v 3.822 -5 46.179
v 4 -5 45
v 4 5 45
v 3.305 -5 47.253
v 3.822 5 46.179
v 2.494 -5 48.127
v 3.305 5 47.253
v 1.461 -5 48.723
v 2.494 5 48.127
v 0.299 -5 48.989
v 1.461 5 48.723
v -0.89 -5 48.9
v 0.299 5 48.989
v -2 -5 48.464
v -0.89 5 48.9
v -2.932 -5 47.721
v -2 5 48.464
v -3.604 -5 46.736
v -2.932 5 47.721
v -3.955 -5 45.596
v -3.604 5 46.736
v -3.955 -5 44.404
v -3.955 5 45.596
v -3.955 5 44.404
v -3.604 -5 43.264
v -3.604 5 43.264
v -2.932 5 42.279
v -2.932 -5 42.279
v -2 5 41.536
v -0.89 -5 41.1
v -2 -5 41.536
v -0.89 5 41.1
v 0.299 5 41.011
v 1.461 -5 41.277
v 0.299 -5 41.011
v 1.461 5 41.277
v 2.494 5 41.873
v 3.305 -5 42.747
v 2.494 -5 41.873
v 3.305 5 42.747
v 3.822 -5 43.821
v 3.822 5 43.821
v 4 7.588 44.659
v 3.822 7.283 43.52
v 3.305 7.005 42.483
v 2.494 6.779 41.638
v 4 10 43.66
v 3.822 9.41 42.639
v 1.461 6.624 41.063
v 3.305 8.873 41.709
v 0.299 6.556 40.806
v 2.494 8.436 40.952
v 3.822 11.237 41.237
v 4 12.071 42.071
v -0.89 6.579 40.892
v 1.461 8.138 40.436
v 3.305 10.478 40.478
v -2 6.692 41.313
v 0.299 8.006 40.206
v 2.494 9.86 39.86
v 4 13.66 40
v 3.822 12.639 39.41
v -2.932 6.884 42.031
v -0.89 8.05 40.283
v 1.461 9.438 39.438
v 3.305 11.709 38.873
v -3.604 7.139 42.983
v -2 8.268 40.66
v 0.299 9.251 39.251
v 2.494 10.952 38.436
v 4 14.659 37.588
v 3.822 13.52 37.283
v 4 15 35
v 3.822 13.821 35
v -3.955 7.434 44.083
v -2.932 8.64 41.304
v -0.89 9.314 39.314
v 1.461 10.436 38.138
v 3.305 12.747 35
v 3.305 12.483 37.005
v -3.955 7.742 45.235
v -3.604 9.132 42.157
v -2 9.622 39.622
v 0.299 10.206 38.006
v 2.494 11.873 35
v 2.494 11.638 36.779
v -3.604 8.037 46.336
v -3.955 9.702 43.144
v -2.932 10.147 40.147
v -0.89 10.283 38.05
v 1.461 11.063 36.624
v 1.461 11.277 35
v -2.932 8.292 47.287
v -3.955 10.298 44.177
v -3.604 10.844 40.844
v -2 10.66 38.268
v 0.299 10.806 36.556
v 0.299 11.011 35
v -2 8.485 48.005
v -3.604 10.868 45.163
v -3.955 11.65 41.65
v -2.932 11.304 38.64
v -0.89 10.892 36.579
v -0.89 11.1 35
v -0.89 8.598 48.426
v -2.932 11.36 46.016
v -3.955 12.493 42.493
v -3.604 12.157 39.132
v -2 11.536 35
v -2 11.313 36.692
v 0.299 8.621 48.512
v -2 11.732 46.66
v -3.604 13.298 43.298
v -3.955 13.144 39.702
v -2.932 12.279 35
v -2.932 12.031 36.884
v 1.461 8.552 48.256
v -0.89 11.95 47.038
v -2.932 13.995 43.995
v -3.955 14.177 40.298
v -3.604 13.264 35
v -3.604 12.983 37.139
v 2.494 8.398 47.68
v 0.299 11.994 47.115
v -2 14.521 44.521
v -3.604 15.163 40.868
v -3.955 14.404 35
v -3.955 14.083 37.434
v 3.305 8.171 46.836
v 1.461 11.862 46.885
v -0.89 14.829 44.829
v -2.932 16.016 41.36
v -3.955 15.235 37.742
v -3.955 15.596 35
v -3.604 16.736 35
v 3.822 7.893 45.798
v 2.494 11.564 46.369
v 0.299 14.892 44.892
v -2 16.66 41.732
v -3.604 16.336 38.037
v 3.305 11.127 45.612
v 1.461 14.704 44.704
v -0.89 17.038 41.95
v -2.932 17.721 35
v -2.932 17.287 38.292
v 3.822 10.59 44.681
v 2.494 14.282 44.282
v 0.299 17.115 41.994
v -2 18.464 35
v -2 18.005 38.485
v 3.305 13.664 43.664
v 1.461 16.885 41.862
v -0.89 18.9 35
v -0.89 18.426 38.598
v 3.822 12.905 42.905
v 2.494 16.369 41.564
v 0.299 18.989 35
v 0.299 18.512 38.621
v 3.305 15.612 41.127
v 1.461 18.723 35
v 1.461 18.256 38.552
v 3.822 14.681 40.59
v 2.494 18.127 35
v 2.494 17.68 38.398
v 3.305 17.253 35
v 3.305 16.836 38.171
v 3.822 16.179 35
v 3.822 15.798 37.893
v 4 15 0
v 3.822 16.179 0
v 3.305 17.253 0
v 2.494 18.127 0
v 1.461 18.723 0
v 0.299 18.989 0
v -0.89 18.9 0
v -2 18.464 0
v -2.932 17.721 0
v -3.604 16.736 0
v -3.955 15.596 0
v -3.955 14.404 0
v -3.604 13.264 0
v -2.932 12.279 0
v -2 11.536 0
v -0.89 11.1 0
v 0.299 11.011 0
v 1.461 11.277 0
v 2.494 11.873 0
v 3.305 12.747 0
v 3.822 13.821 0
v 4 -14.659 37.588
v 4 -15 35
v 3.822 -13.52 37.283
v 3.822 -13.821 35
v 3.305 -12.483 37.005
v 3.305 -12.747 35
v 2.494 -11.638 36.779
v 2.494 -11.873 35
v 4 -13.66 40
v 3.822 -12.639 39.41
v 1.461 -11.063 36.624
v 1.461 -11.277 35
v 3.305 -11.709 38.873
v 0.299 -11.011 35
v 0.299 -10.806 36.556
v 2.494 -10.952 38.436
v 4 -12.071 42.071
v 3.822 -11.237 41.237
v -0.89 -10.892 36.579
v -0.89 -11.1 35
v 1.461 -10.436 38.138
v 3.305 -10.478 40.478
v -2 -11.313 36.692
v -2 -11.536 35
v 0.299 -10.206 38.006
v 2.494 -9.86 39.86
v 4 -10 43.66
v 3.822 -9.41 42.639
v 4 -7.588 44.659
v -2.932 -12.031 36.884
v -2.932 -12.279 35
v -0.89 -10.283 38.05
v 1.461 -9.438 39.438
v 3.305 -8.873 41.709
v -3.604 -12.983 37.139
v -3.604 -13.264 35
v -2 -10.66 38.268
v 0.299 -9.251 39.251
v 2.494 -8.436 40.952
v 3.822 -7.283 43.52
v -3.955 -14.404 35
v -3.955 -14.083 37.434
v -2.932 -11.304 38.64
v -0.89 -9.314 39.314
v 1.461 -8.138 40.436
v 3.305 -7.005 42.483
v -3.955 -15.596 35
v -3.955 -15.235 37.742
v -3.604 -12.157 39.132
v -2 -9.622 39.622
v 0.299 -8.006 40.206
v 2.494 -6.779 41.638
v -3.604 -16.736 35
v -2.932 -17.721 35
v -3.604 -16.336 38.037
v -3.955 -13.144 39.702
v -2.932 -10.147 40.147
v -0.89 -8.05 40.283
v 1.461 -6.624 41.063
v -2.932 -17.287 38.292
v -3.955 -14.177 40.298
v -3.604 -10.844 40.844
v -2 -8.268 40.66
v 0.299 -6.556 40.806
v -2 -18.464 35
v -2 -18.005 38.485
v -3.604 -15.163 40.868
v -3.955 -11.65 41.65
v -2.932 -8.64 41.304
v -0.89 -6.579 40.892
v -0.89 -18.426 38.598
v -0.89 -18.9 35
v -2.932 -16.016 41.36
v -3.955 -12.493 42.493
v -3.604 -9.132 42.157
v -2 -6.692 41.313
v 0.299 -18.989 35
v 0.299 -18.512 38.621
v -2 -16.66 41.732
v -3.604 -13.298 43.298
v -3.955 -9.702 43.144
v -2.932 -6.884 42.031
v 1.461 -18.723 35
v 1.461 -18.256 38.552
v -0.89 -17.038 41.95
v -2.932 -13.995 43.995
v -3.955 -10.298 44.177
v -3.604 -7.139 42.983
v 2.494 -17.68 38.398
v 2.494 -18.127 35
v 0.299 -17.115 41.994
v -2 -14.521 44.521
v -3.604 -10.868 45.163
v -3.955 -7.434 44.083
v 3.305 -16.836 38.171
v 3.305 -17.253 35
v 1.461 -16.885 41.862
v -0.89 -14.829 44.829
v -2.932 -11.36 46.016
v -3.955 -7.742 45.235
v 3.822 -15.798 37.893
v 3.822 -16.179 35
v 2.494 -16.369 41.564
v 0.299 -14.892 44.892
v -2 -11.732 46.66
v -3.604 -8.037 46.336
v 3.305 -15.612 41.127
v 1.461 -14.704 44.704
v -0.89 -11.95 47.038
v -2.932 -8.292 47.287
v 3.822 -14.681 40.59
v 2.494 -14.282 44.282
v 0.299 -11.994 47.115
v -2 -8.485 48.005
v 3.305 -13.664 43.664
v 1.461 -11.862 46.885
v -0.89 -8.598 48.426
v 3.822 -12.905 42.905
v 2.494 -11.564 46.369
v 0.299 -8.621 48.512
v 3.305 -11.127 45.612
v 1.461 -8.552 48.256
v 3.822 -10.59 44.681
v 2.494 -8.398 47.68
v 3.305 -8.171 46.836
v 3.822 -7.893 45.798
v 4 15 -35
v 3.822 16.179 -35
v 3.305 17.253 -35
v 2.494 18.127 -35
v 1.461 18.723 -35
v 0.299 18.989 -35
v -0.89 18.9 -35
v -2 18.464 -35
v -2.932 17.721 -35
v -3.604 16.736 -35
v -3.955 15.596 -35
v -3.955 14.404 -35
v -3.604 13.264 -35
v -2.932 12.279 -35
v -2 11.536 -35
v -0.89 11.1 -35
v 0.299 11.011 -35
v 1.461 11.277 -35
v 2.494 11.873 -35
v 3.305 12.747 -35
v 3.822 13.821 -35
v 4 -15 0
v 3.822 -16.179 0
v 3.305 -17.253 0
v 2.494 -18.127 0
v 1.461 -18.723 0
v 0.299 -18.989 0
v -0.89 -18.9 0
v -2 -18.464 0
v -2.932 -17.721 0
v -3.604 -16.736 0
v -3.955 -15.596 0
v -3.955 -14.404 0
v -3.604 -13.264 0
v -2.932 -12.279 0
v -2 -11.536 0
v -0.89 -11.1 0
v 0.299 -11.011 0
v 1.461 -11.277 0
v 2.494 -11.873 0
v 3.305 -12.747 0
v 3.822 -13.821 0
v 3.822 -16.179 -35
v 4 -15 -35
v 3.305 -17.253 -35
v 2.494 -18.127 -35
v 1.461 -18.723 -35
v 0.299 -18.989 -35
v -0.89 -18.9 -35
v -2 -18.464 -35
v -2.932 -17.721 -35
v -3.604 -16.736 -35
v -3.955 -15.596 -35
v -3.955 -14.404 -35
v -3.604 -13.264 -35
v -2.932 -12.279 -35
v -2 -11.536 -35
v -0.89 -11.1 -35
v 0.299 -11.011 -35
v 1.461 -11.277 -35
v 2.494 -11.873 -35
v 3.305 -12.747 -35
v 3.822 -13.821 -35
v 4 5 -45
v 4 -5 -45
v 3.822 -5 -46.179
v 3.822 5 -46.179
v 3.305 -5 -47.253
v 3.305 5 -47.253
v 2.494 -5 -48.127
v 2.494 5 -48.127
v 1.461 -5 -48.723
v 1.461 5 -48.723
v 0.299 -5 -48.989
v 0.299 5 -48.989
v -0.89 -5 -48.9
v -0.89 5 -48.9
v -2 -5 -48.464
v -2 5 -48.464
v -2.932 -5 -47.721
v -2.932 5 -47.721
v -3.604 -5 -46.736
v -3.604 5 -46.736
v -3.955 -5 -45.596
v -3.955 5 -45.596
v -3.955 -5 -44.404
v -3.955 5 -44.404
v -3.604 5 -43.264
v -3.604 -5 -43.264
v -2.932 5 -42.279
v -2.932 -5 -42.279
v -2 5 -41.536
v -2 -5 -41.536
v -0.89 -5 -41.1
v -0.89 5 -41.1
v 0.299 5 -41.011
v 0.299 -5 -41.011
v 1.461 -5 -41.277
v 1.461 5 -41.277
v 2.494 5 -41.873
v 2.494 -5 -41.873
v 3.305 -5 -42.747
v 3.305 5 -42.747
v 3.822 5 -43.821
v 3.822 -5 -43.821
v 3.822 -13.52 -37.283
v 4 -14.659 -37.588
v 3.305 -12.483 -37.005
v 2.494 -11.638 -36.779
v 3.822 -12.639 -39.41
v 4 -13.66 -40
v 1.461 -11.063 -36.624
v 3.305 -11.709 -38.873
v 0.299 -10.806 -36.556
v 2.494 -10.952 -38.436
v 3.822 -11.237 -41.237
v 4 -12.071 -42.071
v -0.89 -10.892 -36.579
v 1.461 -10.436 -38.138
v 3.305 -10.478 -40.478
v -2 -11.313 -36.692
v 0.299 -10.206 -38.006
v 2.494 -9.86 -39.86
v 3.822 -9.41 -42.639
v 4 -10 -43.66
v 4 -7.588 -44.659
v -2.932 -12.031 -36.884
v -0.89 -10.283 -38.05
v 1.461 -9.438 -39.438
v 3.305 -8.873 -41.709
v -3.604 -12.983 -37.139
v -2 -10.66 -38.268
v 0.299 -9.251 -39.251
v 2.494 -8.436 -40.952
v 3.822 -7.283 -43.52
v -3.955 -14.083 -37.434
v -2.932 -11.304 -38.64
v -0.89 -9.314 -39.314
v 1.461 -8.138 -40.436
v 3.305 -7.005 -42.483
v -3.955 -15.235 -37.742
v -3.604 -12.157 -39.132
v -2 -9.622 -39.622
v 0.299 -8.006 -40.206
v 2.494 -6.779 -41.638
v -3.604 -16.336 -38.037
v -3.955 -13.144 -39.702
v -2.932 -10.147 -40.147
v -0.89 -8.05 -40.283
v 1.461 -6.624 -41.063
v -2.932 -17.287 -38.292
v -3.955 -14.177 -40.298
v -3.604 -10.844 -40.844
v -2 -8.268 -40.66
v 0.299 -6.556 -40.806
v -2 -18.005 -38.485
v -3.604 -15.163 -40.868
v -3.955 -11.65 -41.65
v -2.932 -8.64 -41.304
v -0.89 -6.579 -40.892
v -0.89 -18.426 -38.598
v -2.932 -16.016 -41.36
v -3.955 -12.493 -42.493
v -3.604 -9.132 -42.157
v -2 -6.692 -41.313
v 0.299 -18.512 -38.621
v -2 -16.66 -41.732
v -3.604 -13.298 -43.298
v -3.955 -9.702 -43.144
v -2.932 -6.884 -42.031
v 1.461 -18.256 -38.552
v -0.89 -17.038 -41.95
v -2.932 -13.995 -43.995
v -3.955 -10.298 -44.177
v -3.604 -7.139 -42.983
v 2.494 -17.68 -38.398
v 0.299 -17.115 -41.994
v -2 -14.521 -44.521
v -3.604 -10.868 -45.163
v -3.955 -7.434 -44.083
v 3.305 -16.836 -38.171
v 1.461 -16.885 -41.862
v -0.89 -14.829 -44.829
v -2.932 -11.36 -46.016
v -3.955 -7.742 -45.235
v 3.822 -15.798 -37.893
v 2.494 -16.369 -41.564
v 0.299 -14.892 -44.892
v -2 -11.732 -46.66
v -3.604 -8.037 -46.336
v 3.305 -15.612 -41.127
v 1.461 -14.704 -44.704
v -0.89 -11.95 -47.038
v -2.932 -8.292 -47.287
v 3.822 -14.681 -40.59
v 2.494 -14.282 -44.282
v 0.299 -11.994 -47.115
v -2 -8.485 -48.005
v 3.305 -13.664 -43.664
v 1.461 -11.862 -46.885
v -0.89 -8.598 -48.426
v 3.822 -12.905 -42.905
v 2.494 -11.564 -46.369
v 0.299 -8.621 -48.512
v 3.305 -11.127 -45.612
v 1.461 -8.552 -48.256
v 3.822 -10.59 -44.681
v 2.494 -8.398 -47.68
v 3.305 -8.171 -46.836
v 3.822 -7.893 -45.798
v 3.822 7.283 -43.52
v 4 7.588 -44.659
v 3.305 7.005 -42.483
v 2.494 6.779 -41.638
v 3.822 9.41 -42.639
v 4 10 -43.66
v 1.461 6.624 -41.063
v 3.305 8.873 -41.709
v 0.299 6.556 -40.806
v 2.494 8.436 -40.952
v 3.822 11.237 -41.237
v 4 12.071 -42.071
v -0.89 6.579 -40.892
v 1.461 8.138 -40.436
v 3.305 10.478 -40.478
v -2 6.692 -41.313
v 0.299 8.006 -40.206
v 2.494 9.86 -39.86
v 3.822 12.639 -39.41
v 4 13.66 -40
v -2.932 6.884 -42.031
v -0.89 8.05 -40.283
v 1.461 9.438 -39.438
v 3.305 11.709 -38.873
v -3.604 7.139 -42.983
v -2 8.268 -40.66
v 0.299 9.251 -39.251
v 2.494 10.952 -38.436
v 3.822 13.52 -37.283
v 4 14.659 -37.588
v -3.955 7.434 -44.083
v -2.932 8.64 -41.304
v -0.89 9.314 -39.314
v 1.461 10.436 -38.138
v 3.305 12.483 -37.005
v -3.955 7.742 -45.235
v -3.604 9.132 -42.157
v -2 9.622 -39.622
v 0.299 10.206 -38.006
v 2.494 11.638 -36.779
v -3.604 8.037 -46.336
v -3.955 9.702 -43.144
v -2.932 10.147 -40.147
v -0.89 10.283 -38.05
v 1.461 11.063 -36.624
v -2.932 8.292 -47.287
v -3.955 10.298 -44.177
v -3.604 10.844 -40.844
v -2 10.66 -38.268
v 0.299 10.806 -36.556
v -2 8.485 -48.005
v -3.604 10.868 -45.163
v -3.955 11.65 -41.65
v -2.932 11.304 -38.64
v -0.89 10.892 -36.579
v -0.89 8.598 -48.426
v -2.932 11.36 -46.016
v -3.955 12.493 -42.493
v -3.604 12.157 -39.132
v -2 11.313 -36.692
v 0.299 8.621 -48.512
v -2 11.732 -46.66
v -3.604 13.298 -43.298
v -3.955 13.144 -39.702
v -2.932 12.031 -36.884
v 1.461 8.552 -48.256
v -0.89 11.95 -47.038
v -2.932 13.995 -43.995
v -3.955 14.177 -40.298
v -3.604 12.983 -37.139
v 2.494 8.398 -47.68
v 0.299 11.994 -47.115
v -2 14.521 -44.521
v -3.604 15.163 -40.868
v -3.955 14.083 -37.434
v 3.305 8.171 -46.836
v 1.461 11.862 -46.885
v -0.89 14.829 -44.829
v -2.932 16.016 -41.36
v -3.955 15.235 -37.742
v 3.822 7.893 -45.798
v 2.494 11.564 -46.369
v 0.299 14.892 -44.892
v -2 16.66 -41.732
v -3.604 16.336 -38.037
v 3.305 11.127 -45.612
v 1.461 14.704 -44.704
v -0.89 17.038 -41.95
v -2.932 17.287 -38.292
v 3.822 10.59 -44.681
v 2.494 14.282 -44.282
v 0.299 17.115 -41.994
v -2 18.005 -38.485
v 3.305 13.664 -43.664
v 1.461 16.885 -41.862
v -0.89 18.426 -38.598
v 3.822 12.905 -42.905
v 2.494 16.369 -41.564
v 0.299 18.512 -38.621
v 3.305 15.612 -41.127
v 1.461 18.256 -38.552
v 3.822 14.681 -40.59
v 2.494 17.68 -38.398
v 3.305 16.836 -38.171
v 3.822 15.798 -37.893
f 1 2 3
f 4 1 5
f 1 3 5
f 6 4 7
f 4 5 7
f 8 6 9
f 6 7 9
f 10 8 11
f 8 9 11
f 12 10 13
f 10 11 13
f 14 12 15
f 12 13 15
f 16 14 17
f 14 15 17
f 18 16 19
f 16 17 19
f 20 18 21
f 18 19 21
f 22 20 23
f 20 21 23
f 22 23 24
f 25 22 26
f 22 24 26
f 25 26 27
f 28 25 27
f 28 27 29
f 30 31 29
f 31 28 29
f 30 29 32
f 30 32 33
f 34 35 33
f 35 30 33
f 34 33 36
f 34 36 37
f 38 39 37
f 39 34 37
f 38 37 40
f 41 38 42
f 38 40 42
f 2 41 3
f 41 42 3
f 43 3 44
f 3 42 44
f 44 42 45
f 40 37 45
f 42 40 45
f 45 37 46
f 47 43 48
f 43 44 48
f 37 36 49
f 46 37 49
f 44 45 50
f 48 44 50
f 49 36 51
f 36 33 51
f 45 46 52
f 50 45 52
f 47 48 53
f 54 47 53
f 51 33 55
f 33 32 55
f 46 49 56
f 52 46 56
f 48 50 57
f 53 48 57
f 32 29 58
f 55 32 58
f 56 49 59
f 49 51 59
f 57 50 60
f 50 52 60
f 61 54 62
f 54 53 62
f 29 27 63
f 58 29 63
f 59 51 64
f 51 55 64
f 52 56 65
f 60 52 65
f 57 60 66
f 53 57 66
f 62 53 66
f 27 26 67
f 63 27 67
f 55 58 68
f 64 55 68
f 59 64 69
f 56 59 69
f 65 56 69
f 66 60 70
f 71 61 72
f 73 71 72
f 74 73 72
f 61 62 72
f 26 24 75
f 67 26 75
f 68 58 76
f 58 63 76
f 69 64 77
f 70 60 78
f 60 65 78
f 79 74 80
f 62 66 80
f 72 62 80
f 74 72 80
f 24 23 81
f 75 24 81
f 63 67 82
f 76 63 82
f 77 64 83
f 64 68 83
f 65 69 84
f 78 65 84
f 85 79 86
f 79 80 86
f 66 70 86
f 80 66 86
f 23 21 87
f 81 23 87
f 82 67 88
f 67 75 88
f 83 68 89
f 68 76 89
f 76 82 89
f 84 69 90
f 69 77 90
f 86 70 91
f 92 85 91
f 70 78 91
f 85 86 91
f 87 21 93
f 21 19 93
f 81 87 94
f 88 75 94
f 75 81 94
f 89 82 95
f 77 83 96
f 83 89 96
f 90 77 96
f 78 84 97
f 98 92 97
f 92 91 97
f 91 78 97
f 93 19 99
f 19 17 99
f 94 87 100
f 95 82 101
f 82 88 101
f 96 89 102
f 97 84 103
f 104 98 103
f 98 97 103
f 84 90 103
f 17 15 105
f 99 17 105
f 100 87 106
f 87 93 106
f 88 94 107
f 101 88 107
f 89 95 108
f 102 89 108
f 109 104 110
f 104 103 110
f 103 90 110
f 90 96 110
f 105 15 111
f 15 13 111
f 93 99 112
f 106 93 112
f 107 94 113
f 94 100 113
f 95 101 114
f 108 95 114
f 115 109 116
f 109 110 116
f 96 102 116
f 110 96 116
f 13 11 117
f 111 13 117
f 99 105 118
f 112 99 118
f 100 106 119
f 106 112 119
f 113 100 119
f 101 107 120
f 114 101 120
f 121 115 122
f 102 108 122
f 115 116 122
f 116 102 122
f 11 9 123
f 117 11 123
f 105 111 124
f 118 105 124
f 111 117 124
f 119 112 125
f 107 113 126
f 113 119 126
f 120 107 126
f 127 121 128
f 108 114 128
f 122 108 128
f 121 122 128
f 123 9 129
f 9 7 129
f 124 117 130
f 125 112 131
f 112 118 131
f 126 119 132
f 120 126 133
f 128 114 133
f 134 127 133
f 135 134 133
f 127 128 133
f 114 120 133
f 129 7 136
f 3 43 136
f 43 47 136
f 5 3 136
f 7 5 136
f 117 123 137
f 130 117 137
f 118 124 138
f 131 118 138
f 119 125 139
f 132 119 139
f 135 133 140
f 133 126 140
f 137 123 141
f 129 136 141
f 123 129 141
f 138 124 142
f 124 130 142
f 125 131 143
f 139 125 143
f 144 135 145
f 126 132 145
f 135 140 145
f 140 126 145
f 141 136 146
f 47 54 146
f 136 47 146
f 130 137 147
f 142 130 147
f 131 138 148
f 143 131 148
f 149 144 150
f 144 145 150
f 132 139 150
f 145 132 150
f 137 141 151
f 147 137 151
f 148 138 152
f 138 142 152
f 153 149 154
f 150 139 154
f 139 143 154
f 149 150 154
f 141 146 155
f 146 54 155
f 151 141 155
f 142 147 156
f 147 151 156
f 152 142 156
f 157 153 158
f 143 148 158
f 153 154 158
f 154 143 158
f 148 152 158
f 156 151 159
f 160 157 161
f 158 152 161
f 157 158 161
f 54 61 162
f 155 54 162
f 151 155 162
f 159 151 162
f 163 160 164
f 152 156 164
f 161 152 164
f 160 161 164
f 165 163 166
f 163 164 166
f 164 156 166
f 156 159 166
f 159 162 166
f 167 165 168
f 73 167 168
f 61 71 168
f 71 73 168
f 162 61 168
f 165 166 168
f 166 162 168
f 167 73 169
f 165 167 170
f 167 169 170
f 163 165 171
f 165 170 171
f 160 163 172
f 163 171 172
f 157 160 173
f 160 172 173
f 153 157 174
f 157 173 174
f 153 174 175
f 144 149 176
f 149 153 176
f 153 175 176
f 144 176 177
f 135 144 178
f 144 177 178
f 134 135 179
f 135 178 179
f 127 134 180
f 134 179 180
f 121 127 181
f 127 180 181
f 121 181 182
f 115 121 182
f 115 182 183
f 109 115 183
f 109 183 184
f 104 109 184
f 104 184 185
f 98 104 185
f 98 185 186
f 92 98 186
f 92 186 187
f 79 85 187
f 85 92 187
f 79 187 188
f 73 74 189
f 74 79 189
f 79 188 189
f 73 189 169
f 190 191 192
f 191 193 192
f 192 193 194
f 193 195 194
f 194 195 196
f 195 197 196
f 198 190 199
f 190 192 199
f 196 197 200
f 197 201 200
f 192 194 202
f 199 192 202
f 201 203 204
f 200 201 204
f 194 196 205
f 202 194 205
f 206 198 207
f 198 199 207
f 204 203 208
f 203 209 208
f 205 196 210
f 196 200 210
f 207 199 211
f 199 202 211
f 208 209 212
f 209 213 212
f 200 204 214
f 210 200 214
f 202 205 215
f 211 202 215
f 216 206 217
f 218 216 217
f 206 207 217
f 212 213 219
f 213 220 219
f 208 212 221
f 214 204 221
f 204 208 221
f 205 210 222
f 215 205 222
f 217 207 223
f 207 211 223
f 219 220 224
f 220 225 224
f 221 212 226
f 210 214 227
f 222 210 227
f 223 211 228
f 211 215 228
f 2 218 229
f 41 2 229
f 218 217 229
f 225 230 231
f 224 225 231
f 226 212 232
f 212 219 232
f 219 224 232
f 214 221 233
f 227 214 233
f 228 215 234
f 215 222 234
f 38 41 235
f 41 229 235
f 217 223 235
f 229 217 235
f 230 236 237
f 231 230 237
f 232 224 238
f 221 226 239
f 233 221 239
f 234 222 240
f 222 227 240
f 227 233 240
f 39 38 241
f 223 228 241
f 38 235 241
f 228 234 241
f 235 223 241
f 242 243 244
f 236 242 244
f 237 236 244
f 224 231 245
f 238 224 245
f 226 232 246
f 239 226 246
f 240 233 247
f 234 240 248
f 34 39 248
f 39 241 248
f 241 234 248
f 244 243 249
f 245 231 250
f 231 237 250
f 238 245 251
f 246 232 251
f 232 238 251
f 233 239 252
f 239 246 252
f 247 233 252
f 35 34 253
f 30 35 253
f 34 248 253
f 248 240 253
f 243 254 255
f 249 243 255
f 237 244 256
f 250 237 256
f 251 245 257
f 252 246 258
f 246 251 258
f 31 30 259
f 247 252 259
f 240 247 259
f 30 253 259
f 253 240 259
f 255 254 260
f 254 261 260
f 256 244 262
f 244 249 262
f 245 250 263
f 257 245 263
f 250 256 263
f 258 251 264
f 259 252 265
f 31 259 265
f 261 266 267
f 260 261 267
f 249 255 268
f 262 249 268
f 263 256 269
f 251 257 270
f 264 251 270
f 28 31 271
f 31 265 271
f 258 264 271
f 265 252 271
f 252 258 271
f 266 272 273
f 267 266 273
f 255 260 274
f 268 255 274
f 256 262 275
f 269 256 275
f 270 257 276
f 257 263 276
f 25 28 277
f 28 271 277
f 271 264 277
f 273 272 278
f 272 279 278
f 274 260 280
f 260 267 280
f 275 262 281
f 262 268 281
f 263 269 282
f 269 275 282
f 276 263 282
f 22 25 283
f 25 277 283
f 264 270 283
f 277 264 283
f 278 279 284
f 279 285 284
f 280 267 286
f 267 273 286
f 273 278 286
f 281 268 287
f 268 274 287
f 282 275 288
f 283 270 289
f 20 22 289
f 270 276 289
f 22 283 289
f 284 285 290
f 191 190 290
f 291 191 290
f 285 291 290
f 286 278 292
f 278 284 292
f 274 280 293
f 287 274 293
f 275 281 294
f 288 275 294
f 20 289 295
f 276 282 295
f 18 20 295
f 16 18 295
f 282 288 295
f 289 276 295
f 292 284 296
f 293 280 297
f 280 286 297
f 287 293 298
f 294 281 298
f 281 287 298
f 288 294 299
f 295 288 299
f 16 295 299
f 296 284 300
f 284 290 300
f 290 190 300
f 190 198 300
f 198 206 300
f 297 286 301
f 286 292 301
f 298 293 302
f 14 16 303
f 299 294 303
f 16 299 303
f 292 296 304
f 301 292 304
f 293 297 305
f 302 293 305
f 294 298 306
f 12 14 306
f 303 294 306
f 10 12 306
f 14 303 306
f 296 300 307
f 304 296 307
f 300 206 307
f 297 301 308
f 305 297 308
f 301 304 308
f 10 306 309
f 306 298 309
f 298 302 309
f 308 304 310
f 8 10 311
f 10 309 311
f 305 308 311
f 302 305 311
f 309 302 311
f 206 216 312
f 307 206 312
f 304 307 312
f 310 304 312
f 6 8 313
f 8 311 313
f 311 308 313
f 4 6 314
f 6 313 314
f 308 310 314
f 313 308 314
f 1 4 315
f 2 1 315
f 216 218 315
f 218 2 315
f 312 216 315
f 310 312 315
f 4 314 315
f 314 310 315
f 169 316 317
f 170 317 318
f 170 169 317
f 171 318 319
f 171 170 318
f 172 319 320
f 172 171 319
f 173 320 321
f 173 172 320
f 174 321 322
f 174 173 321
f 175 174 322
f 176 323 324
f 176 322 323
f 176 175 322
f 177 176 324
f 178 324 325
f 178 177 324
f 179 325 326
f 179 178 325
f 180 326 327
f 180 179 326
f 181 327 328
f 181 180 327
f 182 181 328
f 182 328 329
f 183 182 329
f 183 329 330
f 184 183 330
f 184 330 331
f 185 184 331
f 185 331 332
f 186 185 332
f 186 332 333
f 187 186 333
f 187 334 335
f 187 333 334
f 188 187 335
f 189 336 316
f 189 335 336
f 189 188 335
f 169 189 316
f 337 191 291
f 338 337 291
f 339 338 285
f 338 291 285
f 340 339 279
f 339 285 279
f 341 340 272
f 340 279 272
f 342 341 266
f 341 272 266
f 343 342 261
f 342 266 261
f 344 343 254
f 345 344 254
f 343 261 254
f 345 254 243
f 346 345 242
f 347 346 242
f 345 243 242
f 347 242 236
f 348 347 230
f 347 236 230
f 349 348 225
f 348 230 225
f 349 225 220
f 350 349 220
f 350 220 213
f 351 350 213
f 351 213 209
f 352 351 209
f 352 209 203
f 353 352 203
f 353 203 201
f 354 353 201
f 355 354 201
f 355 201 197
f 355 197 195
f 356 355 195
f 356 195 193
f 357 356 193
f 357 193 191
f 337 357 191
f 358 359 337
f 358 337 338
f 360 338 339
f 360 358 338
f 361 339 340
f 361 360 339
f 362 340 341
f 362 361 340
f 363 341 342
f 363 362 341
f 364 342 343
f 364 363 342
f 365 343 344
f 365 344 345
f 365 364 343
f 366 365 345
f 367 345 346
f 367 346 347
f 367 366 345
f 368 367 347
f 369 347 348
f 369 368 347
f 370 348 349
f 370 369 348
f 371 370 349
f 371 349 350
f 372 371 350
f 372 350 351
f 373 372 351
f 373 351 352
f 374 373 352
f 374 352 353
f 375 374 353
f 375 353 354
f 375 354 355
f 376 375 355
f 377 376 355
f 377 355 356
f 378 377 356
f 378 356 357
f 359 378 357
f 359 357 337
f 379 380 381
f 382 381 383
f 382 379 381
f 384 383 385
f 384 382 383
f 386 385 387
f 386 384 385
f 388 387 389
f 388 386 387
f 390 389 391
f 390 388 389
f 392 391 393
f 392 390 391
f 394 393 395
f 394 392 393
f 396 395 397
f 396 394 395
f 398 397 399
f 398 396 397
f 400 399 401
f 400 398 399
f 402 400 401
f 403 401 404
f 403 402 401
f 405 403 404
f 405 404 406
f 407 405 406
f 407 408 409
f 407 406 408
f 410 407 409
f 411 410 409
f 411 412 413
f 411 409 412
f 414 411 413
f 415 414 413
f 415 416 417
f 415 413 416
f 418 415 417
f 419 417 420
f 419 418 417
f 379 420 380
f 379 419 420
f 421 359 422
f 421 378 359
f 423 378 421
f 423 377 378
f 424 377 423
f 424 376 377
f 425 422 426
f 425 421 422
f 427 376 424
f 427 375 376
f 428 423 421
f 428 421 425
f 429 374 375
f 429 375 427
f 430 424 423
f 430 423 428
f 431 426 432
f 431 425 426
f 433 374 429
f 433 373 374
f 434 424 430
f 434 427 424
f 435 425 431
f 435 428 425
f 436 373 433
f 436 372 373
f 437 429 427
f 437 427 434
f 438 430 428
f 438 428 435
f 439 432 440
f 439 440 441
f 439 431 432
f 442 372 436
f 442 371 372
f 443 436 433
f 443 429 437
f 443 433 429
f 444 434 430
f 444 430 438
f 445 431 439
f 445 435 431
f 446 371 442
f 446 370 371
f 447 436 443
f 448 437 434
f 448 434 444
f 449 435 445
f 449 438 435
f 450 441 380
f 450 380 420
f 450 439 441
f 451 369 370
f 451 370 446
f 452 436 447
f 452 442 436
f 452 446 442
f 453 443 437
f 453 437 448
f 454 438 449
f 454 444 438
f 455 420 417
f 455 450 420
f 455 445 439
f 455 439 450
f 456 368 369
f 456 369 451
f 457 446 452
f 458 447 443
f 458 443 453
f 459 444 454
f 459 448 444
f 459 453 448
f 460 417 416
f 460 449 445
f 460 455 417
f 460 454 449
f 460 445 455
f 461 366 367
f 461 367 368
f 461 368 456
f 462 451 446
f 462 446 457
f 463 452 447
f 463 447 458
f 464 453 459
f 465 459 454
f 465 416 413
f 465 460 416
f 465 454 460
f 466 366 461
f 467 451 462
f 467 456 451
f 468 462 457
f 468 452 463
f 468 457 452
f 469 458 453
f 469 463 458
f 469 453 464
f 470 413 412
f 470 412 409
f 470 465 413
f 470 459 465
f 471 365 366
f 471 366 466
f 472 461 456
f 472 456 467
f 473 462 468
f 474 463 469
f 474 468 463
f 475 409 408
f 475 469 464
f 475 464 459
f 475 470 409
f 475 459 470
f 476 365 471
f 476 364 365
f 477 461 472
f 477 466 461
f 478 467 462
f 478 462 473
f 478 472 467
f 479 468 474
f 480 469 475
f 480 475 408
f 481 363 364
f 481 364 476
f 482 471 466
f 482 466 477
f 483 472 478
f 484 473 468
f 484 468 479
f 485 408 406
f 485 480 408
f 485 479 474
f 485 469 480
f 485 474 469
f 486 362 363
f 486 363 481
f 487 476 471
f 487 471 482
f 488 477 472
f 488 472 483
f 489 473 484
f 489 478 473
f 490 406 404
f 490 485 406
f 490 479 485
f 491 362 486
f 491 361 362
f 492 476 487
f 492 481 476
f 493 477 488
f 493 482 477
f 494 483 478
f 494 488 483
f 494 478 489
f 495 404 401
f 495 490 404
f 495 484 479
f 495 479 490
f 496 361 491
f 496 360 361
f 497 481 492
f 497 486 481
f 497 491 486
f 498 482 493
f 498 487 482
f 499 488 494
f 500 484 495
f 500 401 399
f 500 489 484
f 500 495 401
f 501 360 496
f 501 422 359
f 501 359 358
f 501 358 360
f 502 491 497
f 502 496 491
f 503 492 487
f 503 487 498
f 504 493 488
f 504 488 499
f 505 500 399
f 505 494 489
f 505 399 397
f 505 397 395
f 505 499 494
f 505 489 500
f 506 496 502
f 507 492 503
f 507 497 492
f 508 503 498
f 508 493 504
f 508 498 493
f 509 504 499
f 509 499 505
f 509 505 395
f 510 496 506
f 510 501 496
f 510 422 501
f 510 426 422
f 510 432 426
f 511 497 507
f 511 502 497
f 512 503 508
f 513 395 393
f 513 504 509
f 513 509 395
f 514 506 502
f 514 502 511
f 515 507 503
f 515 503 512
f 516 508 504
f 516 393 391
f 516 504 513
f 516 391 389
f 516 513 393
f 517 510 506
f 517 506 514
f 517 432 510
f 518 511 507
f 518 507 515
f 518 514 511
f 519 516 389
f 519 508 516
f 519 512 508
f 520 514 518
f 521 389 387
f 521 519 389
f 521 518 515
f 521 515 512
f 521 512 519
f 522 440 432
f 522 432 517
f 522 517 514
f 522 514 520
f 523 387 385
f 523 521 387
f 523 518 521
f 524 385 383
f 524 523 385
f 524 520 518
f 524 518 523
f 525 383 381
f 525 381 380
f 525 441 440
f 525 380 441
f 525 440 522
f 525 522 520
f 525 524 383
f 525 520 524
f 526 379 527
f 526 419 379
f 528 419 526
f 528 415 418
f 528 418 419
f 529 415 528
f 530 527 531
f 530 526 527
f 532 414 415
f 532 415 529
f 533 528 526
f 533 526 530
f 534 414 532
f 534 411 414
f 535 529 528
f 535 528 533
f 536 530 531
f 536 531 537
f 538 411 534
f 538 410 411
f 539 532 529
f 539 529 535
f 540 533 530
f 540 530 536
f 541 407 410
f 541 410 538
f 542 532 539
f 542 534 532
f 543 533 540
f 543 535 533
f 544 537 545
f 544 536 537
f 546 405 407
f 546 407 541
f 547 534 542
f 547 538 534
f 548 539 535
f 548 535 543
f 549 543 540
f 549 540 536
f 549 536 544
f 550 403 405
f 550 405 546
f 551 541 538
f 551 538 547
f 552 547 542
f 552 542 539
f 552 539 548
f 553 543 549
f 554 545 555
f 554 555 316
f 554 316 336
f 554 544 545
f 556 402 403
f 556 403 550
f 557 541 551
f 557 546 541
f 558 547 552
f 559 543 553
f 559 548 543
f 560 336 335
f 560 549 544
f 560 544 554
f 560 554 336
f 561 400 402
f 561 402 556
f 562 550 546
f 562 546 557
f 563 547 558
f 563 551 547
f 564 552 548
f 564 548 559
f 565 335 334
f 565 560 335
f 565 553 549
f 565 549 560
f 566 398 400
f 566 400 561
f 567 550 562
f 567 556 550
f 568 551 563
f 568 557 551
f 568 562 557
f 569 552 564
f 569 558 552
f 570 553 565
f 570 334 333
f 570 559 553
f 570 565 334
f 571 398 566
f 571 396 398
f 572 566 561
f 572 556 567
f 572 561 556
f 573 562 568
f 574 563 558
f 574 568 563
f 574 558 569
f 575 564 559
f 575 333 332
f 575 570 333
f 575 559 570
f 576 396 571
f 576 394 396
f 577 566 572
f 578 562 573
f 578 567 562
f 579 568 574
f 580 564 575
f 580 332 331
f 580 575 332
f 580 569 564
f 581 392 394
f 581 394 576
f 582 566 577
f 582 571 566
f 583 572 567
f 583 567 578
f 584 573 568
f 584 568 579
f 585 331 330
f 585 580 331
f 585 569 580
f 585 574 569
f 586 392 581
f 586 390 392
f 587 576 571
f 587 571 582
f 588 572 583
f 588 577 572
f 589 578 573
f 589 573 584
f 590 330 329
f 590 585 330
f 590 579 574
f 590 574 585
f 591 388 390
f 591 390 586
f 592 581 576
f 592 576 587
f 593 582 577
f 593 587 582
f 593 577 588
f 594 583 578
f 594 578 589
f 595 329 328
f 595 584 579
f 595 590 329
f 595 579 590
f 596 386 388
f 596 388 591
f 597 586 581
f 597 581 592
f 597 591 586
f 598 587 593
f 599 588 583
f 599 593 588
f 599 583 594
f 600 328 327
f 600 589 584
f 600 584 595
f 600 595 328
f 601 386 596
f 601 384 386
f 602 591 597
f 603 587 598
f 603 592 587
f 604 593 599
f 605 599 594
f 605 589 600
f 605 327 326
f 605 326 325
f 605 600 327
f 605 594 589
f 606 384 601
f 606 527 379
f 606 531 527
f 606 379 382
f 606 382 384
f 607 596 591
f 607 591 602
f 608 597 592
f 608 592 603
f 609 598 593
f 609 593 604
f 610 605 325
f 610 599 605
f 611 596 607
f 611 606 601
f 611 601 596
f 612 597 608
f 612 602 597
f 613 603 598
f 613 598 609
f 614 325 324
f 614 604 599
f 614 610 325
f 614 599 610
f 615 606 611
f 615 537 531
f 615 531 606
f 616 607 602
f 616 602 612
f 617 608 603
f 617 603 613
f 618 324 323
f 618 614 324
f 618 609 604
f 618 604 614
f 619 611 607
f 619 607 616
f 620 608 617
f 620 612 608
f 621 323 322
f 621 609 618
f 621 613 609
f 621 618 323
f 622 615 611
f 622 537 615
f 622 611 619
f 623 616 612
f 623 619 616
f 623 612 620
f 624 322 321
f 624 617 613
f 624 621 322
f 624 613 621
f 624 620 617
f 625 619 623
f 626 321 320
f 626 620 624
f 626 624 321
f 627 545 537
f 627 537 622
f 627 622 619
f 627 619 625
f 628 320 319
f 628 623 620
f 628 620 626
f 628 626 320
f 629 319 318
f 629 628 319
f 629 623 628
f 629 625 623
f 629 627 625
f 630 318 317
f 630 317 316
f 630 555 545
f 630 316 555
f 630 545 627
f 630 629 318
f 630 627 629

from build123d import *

# Parameters (mm, degrees)
SKETCH_2_R = 4


with BuildPart() as part:
    # По траектории1: sweep along a path in Эскиз1
    with BuildLine(Plane(origin=(0, 0, 0), x_dir=(0, 0, -1), z_dir=(1, 0, 0))) as sweep_1_path:
        Line((0, -15), (35, -15))
        ThreePointArc((35, -15), (42.071067812, -12.071067812), (45, -5))
        Line((45, -5), (45, 5))
        ThreePointArc((45, 5), (42.071067812, 12.071067812), (35, 15))
        Line((35, 15), (0, 15))
    # Эскиз2 → По траектории1 (sweep)
    with BuildSketch(Plane.XY):
        with Locations((0, -15)):
            Circle(SKETCH_2_R)
    sweep(path=sweep_1_path.line)

    # Зеркальное отражение1: part across face


with BuildPart() as part_1:
    add(part.part)
    add(part.part.mirror(Plane(origin=(0, 15, 0), x_dir=(1, 0, 0), z_dir=(0, 0, 1))))


solid = part_1.part
